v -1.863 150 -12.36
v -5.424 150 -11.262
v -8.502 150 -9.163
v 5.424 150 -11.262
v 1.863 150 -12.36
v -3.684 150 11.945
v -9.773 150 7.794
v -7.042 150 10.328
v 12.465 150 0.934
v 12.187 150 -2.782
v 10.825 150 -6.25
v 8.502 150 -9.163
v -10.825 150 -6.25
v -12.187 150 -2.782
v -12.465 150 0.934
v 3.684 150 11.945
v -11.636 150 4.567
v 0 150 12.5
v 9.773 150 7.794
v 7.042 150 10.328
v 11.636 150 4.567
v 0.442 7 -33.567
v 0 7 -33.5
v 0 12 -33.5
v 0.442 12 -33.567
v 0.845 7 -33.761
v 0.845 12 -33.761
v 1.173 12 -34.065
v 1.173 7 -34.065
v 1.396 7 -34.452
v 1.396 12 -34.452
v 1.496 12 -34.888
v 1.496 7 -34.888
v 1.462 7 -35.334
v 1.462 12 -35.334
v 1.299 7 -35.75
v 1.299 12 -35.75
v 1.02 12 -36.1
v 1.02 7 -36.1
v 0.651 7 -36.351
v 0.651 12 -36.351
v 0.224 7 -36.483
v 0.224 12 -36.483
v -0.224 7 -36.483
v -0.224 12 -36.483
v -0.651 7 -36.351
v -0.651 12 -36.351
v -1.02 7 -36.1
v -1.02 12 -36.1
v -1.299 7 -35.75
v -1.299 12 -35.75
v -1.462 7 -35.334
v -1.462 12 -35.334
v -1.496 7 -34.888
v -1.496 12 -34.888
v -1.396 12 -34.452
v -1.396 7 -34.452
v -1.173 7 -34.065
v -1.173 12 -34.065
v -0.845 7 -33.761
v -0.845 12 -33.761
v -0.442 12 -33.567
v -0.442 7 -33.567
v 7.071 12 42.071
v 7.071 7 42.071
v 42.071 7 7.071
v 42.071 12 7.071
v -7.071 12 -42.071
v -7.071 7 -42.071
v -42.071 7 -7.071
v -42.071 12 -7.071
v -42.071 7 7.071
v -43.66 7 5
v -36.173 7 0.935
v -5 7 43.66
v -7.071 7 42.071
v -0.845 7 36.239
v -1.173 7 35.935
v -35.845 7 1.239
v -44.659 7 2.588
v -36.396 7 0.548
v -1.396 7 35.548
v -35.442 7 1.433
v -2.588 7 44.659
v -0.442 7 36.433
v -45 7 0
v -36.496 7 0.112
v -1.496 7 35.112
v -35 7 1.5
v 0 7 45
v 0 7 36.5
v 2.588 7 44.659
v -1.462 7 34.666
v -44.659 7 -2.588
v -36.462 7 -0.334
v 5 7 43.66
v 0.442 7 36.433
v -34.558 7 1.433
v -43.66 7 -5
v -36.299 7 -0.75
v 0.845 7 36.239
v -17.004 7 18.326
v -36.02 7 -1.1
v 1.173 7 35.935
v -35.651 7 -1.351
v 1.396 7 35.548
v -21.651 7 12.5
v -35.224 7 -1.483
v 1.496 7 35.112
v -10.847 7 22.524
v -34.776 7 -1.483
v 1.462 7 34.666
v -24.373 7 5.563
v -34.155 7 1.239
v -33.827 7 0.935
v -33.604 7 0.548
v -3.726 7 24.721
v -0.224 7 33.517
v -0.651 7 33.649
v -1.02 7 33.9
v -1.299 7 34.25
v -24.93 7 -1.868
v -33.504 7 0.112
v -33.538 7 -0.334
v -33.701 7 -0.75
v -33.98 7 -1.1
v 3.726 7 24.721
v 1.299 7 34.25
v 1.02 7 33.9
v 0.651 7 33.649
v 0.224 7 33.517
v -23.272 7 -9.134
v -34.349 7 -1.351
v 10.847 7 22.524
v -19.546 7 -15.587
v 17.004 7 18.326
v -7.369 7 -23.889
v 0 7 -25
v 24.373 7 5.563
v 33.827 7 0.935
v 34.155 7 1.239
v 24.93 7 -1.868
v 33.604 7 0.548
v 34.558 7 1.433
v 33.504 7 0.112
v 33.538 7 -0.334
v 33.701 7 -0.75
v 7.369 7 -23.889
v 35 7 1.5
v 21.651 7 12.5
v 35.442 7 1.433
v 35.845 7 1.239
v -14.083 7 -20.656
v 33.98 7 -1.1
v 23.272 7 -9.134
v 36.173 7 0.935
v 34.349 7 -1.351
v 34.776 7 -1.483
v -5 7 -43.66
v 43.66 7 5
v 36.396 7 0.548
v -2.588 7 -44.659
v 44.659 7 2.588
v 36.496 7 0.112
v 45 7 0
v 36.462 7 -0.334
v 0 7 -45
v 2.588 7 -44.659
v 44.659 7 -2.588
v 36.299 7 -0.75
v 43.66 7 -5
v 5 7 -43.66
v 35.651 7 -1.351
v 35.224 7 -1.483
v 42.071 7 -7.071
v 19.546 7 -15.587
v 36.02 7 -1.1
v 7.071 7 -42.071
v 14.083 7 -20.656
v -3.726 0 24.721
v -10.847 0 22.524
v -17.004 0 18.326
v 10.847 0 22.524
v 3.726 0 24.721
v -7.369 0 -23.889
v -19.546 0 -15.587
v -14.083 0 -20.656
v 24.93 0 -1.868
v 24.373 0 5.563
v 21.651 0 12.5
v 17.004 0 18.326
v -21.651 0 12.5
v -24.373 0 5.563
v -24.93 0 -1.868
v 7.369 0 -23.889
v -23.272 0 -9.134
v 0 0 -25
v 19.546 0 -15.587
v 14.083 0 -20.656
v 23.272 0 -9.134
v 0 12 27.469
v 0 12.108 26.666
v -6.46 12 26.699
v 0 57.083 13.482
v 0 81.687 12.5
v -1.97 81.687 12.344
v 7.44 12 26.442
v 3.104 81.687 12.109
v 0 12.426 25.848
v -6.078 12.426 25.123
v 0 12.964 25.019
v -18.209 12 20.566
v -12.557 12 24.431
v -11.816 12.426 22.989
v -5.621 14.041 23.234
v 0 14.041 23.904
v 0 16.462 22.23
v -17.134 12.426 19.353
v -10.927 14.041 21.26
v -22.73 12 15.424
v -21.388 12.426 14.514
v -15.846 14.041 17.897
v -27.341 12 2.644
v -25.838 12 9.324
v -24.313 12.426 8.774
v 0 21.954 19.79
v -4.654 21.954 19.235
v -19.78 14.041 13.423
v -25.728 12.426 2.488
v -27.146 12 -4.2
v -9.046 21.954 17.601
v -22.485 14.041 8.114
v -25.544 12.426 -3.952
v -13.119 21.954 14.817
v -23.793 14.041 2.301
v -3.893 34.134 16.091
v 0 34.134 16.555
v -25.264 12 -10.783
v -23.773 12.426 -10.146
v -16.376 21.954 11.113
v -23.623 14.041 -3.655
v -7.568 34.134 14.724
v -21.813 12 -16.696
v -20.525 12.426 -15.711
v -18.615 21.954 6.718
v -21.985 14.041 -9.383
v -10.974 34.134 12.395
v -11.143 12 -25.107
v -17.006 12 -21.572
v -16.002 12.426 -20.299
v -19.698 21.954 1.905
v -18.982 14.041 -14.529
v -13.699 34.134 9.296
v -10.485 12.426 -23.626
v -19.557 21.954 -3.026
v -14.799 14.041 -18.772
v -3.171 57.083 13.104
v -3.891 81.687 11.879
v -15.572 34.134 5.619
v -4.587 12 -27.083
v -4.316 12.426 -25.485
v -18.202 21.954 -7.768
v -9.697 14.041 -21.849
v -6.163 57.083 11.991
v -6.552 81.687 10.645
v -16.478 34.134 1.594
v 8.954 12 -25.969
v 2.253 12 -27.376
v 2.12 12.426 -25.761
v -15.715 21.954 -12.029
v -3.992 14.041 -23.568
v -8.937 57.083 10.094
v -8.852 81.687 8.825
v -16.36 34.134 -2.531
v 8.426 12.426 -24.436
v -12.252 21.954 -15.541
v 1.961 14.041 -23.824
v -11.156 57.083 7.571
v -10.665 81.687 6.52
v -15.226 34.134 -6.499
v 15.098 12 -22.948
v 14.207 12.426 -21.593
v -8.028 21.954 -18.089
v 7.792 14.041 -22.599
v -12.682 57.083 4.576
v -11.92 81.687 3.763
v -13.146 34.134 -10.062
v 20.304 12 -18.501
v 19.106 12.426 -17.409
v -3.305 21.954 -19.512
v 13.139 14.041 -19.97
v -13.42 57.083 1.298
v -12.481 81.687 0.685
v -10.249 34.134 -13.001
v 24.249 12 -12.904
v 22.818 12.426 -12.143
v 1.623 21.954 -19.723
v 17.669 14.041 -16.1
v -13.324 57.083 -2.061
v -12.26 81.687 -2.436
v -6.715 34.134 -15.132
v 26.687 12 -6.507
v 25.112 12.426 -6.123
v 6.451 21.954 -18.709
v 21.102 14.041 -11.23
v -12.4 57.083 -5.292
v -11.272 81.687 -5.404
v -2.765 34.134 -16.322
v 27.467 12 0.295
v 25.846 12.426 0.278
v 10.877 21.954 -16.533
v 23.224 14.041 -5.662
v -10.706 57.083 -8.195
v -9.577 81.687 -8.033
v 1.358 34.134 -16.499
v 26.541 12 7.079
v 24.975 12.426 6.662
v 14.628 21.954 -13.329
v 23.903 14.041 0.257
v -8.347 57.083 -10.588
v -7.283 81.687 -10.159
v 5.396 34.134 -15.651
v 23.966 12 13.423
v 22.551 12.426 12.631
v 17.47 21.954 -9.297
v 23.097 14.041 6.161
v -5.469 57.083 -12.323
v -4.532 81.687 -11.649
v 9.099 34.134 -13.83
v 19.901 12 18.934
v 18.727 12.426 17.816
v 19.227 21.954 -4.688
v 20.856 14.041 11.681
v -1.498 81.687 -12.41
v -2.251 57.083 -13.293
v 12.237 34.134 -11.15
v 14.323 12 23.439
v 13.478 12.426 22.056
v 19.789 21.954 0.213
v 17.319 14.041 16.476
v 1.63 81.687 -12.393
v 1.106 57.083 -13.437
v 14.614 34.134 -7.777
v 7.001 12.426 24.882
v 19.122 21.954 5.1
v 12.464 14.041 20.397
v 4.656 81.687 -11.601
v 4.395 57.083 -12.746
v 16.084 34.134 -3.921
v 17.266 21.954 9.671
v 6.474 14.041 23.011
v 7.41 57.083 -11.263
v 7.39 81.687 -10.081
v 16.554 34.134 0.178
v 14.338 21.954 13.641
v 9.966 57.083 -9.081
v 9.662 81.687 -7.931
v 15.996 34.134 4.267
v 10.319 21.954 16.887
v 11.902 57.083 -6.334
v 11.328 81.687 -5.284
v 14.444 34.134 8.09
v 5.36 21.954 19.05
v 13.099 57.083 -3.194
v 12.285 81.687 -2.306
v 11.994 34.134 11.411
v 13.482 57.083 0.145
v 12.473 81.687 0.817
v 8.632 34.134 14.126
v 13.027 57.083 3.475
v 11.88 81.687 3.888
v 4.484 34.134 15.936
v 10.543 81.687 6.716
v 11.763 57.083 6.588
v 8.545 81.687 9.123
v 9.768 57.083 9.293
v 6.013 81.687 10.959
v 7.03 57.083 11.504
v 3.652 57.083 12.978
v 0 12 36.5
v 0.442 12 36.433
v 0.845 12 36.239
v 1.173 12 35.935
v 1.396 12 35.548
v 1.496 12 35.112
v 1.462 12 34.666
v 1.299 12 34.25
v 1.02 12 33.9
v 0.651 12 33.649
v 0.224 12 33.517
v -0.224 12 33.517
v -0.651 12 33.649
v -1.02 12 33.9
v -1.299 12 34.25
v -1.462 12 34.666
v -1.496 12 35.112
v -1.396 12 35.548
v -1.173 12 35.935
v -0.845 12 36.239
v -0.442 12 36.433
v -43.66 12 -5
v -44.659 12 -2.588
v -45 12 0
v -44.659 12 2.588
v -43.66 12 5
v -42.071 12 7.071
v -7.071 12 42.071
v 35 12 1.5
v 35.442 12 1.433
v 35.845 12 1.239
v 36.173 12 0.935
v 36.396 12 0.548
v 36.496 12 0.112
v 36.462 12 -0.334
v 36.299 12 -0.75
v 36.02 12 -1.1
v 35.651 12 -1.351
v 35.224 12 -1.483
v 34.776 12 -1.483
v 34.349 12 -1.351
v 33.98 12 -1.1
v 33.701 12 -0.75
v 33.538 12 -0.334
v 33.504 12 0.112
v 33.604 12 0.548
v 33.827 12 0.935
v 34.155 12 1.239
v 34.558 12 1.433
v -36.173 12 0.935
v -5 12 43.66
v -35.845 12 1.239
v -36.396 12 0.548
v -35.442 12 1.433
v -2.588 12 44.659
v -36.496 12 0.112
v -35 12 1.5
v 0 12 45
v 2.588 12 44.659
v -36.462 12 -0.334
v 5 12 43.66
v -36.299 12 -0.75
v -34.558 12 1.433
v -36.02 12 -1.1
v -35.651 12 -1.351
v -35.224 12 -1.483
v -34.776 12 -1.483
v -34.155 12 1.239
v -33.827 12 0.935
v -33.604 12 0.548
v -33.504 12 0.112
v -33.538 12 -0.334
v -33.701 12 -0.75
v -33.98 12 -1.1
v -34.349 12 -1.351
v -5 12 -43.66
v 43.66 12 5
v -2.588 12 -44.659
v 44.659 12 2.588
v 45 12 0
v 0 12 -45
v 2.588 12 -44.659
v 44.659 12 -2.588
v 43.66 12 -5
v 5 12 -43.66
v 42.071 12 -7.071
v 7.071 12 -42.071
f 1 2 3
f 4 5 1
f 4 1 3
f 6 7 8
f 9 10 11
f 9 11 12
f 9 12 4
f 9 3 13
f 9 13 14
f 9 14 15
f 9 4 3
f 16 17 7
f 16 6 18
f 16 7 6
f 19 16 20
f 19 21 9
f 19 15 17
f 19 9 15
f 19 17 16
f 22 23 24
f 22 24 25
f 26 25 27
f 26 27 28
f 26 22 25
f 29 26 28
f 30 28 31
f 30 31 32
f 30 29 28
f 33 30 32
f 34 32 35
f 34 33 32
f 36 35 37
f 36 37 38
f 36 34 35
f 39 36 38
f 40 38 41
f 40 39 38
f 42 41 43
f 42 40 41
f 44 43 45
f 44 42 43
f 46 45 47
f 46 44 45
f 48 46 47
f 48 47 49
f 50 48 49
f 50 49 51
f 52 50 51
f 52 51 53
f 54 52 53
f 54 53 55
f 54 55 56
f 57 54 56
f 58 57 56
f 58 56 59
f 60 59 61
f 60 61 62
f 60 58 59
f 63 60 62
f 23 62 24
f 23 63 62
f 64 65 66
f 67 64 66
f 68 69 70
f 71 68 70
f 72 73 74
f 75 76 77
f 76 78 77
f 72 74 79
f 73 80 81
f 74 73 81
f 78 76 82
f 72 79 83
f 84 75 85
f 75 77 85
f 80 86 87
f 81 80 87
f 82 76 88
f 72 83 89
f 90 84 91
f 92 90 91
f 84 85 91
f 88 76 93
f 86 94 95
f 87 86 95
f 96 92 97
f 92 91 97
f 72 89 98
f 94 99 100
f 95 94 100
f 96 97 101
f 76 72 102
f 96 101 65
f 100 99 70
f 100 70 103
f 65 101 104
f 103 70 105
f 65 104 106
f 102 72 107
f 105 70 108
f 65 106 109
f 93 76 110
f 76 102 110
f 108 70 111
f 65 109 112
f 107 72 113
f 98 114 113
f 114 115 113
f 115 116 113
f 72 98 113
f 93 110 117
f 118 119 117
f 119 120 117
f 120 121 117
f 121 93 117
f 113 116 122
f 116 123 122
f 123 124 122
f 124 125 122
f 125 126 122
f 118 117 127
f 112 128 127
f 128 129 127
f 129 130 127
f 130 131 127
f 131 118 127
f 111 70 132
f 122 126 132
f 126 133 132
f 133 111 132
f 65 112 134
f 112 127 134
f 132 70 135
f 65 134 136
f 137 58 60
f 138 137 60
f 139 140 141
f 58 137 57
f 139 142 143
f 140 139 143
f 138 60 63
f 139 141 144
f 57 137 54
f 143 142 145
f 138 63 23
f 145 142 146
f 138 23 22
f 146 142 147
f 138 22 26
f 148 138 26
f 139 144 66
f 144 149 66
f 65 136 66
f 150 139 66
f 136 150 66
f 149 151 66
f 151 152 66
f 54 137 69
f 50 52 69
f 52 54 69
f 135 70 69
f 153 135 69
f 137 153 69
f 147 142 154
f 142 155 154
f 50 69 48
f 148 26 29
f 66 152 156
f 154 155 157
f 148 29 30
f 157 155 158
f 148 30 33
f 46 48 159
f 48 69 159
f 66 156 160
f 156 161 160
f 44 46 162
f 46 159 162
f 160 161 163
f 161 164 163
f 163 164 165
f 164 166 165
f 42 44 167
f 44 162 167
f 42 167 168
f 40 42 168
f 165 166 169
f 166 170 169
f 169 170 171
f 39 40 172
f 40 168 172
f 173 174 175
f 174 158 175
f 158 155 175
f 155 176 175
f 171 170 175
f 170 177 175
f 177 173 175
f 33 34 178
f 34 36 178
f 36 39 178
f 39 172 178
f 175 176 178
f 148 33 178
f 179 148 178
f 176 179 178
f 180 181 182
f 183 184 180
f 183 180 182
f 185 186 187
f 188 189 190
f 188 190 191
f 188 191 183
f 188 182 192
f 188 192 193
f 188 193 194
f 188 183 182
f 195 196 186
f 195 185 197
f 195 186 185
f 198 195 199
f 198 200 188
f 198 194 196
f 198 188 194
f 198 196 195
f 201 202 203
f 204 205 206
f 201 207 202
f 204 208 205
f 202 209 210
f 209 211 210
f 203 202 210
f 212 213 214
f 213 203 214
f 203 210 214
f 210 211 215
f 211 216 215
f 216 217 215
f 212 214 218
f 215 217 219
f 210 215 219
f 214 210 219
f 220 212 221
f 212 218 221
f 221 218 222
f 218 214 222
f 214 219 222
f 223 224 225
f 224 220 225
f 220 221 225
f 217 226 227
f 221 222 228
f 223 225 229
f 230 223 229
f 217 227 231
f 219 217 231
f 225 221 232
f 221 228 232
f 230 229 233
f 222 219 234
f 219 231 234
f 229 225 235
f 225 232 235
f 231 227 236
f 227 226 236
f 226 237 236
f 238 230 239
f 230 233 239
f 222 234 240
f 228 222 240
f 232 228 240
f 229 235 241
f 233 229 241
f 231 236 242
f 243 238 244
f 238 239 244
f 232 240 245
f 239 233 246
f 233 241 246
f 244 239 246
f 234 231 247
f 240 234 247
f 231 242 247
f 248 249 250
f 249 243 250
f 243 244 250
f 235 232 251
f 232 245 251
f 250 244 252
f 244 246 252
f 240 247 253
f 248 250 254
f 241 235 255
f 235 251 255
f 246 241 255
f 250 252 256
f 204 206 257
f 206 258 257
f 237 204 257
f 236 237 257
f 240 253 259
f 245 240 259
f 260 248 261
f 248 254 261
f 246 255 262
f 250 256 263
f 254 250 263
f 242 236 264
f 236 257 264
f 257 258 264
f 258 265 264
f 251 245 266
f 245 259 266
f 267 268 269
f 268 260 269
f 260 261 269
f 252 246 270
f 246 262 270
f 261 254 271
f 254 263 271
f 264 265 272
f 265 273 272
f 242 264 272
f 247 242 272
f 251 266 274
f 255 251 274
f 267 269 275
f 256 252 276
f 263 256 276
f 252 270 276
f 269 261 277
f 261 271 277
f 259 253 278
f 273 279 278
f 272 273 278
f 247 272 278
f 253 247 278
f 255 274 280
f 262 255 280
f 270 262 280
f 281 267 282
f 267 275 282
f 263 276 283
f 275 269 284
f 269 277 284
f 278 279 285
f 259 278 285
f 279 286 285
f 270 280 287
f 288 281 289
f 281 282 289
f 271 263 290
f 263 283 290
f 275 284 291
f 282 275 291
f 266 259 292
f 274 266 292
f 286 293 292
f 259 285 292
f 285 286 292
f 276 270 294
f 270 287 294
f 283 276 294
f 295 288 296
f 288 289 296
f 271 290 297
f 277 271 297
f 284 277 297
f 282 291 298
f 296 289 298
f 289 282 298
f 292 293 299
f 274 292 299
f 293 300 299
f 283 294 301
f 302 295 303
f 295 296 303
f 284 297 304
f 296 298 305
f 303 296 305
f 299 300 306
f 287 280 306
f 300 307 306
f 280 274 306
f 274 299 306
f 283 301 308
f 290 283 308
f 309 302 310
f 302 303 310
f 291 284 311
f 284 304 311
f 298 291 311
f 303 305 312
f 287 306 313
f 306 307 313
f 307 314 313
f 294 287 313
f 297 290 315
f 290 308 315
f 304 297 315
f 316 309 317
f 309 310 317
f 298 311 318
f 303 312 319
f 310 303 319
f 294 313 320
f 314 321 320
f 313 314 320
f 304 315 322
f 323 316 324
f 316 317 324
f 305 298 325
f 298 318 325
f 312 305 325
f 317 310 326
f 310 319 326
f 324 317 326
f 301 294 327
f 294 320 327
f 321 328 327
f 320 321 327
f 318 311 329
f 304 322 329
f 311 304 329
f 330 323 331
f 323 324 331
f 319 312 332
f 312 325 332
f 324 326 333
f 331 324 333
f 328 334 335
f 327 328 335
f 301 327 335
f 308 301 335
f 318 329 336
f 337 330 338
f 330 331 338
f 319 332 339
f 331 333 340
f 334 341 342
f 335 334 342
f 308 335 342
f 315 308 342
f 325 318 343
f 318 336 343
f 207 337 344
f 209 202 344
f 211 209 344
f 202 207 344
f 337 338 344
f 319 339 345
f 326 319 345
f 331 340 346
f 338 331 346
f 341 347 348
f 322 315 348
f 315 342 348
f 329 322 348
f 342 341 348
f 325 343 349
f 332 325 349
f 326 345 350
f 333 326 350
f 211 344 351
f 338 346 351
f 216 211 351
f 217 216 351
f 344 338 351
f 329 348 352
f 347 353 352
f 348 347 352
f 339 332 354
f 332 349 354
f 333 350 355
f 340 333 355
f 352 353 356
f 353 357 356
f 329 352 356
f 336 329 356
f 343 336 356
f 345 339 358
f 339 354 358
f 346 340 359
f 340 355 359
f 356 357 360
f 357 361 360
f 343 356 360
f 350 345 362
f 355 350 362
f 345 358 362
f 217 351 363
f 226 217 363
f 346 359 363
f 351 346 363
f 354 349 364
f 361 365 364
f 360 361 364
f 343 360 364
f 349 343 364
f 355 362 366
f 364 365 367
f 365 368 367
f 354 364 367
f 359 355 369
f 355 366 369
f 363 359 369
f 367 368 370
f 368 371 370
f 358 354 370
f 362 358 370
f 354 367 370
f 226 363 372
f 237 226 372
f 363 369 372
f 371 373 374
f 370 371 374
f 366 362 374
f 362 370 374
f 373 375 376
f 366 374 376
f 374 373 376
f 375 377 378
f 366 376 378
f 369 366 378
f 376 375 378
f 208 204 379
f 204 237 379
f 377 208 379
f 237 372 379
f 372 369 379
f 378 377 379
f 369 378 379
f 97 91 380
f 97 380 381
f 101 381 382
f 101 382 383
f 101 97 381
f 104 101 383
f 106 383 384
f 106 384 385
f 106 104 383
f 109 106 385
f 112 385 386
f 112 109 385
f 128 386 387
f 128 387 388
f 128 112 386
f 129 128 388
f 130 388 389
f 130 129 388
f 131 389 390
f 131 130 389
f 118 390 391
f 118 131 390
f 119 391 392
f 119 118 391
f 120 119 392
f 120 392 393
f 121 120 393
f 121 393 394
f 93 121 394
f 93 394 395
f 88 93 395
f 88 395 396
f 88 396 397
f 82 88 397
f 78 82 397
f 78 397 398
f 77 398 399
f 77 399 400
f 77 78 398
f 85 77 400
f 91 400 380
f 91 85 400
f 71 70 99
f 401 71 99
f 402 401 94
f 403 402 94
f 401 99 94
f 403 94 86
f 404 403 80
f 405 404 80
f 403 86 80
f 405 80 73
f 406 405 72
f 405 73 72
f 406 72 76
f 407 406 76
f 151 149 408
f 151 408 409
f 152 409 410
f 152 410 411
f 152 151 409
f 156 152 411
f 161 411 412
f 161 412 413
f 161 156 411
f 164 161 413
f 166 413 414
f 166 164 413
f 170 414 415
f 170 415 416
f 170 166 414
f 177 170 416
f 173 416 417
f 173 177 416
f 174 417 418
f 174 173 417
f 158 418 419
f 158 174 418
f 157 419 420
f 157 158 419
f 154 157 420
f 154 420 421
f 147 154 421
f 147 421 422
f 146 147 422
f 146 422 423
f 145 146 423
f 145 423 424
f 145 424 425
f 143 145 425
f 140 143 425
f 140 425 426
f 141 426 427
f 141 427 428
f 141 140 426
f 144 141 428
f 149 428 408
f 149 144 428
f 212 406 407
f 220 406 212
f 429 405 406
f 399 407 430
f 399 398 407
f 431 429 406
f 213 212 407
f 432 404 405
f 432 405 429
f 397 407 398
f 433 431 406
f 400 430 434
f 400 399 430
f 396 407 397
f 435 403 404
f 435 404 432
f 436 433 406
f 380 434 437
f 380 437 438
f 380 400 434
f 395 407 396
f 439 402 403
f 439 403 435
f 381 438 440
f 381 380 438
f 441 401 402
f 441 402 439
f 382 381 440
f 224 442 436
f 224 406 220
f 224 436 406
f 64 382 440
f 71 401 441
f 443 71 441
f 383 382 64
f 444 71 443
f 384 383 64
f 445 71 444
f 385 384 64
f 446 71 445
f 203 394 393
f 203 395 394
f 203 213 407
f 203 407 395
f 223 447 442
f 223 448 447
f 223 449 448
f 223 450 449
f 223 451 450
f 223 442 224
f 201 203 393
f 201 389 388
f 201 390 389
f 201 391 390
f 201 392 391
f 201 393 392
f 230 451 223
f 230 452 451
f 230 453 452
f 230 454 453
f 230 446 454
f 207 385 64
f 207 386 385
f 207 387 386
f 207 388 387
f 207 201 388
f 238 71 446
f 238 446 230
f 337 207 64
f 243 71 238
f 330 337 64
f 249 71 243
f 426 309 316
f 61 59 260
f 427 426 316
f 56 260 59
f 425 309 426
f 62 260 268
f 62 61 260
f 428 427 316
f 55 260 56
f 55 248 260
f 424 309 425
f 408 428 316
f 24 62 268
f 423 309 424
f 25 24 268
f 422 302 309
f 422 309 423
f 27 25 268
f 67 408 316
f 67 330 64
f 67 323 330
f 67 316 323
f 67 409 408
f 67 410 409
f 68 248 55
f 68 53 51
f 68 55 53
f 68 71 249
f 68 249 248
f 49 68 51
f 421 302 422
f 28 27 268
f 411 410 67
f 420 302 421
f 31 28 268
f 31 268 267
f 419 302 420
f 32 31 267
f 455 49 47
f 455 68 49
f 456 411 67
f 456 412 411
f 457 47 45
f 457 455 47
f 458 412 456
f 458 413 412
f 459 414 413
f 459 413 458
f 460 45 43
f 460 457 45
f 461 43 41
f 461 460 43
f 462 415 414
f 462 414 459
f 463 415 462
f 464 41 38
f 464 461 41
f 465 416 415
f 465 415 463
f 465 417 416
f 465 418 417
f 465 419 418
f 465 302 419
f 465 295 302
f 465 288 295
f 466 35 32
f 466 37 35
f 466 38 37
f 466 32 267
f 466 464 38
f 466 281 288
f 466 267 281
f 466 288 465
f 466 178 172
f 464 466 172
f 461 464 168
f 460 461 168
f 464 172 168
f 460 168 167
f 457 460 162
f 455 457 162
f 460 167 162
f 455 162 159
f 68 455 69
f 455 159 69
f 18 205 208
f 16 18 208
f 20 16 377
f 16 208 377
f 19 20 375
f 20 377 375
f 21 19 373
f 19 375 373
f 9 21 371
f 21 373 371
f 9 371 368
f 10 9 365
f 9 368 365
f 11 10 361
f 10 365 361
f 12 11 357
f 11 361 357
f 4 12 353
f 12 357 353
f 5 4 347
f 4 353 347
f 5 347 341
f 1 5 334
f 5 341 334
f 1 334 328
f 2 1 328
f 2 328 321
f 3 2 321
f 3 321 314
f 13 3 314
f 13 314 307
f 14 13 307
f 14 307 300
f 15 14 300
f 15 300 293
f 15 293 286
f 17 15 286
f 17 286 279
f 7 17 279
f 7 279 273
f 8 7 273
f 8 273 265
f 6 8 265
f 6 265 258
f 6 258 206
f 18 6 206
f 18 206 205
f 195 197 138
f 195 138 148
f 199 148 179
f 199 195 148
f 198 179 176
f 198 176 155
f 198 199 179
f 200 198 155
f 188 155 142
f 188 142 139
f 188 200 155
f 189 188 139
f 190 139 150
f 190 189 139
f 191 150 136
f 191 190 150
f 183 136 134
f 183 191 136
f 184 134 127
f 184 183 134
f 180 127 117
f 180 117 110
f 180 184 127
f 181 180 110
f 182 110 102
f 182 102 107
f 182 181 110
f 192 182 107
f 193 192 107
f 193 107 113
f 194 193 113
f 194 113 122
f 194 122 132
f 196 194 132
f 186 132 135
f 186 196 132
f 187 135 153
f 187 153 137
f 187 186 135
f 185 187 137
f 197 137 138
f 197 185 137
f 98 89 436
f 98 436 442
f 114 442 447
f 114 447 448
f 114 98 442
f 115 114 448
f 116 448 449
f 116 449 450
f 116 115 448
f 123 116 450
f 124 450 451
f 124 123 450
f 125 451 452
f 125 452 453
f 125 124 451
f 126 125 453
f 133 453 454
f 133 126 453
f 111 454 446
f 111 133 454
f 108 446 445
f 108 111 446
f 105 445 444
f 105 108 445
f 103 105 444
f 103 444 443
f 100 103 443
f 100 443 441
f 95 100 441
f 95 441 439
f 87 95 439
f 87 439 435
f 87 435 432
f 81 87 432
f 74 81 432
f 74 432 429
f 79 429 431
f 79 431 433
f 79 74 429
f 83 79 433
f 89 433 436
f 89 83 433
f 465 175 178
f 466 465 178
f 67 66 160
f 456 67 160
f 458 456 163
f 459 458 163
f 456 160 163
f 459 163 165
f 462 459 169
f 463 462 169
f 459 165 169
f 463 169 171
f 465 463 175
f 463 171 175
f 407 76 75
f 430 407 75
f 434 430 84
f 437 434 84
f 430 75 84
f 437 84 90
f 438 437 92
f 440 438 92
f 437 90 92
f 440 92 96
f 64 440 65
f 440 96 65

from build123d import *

# Parameters (mm, degrees)
CROQUIS1_R              = 12.5
SALIENTE_EXTRUIR1_DEPTH = 150
CROQUIS2_R              = 25
SALIENTE_EXTRUIR2_DEPTH = 7
CROQUIS3_R              = 1.5
SALIENTE_EXTRUIR3_DEPTH = 5
REDONDEO1_SIZE          = 15
REDONDEO1_SIZE_2        = 70


with BuildPart() as part:
    # Croquis1 → Saliente-Extruir1 (new body)
    with BuildSketch(Plane(origin=(0, 0, 0), x_dir=(1, 0, 0), z_dir=(0, 1, 0))):
        with Locations(Location((0, 0, 0), (0, 0, 270))):
            Circle(CROQUIS1_R)
    extrude(amount=SALIENTE_EXTRUIR1_DEPTH)

    # Croquis2 → Saliente-Extruir2 (add)
    with BuildSketch(Plane.XZ):
        with Locations(Location((0, 0, 0), (0, 0, 270))):
            Circle(CROQUIS2_R)
    extrude(amount=-SALIENTE_EXTRUIR2_DEPTH)

    # Croquis3 → Saliente-Extruir3 (add)
    with BuildSketch(Plane(origin=(0, 7, 0), x_dir=(1, 0, 0), z_dir=(0, 1, 0))):
        with BuildLine():
            Line((-7.071067812, 42.071067812), (-42.071067812, 7.071067812))
            ThreePointArc((-42.071067812, 7.071067812), (-45, 0), (-42.071067812, -7.071067812))
            Line((-42.071067812, -7.071067812), (-7.071067812, -42.071067812))
            ThreePointArc((-7.071067812, -42.071067812), (0, -45), (7.071067812, -42.071067812))
            Line((7.071067812, -42.071067812), (42.071067812, -7.071067812))
            ThreePointArc((42.071067812, -7.071067812), (45, 0), (42.071067812, 7.071067812))
            Line((42.071067812, 7.071067812), (7.071067812, 42.071067812))
            ThreePointArc((7.071067812, 42.071067812), (0, 45), (-7.071067812, 42.071067812))
        make_face()
        with Locations(Location((-35, 0, 0), (0, 0, 270))):
            Circle(CROQUIS3_R, mode=Mode.SUBTRACT)
        with Locations(Location((0, 35, 0), (0, 0, 270))):
            Circle(CROQUIS3_R, mode=Mode.SUBTRACT)
        with Locations(Location((35, 0, 0), (0, 0, 270))):
            Circle(CROQUIS3_R, mode=Mode.SUBTRACT)
        with Locations(Location((0, -35, 0), (0, 0, 270))):
            Circle(CROQUIS3_R, mode=Mode.SUBTRACT)
    extrude(amount=SALIENTE_EXTRUIR3_DEPTH)

    # Redondeo1
    # an asymmetric fillet: 70, 15 mm, written as the material it adds along each edge
    with BuildSketch(Plane(origin=(0, 12, 0), x_dir=(0, 0, 1), z_dir=(1, 0, 0))) as redondeo1_piece_1:
        with BuildLine():
            Bezier((12.5 + REDONDEO1_SIZE, REDONDEO1_SIZE * 9.99999999998e-06), (12.49985, 0.00015), (12.5 - REDONDEO1_SIZE_2 * 2.14285714285e-06, -REDONDEO1_SIZE_2), weights=[1, 0.707106781, 1])
            Line((12.5 - REDONDEO1_SIZE_2 * 2.14285714285e-06, -REDONDEO1_SIZE_2), (11.09985, -70))
            ThreePointArc((11.09985, -70), (11.1, -35), (11.1, 0))
            Line((11.1, 0), (12.5, 1.4))
            ThreePointArc((12.5, 1.4), (20, 1.4), (27.5, 1.40015))
            Line((27.5, 1.40015), (12.5 + REDONDEO1_SIZE, REDONDEO1_SIZE * 9.99999999998e-06))
        make_face()
    revolve(axis=Axis((0, 12, 0), (0, -1, 0)))


solid = part.part
